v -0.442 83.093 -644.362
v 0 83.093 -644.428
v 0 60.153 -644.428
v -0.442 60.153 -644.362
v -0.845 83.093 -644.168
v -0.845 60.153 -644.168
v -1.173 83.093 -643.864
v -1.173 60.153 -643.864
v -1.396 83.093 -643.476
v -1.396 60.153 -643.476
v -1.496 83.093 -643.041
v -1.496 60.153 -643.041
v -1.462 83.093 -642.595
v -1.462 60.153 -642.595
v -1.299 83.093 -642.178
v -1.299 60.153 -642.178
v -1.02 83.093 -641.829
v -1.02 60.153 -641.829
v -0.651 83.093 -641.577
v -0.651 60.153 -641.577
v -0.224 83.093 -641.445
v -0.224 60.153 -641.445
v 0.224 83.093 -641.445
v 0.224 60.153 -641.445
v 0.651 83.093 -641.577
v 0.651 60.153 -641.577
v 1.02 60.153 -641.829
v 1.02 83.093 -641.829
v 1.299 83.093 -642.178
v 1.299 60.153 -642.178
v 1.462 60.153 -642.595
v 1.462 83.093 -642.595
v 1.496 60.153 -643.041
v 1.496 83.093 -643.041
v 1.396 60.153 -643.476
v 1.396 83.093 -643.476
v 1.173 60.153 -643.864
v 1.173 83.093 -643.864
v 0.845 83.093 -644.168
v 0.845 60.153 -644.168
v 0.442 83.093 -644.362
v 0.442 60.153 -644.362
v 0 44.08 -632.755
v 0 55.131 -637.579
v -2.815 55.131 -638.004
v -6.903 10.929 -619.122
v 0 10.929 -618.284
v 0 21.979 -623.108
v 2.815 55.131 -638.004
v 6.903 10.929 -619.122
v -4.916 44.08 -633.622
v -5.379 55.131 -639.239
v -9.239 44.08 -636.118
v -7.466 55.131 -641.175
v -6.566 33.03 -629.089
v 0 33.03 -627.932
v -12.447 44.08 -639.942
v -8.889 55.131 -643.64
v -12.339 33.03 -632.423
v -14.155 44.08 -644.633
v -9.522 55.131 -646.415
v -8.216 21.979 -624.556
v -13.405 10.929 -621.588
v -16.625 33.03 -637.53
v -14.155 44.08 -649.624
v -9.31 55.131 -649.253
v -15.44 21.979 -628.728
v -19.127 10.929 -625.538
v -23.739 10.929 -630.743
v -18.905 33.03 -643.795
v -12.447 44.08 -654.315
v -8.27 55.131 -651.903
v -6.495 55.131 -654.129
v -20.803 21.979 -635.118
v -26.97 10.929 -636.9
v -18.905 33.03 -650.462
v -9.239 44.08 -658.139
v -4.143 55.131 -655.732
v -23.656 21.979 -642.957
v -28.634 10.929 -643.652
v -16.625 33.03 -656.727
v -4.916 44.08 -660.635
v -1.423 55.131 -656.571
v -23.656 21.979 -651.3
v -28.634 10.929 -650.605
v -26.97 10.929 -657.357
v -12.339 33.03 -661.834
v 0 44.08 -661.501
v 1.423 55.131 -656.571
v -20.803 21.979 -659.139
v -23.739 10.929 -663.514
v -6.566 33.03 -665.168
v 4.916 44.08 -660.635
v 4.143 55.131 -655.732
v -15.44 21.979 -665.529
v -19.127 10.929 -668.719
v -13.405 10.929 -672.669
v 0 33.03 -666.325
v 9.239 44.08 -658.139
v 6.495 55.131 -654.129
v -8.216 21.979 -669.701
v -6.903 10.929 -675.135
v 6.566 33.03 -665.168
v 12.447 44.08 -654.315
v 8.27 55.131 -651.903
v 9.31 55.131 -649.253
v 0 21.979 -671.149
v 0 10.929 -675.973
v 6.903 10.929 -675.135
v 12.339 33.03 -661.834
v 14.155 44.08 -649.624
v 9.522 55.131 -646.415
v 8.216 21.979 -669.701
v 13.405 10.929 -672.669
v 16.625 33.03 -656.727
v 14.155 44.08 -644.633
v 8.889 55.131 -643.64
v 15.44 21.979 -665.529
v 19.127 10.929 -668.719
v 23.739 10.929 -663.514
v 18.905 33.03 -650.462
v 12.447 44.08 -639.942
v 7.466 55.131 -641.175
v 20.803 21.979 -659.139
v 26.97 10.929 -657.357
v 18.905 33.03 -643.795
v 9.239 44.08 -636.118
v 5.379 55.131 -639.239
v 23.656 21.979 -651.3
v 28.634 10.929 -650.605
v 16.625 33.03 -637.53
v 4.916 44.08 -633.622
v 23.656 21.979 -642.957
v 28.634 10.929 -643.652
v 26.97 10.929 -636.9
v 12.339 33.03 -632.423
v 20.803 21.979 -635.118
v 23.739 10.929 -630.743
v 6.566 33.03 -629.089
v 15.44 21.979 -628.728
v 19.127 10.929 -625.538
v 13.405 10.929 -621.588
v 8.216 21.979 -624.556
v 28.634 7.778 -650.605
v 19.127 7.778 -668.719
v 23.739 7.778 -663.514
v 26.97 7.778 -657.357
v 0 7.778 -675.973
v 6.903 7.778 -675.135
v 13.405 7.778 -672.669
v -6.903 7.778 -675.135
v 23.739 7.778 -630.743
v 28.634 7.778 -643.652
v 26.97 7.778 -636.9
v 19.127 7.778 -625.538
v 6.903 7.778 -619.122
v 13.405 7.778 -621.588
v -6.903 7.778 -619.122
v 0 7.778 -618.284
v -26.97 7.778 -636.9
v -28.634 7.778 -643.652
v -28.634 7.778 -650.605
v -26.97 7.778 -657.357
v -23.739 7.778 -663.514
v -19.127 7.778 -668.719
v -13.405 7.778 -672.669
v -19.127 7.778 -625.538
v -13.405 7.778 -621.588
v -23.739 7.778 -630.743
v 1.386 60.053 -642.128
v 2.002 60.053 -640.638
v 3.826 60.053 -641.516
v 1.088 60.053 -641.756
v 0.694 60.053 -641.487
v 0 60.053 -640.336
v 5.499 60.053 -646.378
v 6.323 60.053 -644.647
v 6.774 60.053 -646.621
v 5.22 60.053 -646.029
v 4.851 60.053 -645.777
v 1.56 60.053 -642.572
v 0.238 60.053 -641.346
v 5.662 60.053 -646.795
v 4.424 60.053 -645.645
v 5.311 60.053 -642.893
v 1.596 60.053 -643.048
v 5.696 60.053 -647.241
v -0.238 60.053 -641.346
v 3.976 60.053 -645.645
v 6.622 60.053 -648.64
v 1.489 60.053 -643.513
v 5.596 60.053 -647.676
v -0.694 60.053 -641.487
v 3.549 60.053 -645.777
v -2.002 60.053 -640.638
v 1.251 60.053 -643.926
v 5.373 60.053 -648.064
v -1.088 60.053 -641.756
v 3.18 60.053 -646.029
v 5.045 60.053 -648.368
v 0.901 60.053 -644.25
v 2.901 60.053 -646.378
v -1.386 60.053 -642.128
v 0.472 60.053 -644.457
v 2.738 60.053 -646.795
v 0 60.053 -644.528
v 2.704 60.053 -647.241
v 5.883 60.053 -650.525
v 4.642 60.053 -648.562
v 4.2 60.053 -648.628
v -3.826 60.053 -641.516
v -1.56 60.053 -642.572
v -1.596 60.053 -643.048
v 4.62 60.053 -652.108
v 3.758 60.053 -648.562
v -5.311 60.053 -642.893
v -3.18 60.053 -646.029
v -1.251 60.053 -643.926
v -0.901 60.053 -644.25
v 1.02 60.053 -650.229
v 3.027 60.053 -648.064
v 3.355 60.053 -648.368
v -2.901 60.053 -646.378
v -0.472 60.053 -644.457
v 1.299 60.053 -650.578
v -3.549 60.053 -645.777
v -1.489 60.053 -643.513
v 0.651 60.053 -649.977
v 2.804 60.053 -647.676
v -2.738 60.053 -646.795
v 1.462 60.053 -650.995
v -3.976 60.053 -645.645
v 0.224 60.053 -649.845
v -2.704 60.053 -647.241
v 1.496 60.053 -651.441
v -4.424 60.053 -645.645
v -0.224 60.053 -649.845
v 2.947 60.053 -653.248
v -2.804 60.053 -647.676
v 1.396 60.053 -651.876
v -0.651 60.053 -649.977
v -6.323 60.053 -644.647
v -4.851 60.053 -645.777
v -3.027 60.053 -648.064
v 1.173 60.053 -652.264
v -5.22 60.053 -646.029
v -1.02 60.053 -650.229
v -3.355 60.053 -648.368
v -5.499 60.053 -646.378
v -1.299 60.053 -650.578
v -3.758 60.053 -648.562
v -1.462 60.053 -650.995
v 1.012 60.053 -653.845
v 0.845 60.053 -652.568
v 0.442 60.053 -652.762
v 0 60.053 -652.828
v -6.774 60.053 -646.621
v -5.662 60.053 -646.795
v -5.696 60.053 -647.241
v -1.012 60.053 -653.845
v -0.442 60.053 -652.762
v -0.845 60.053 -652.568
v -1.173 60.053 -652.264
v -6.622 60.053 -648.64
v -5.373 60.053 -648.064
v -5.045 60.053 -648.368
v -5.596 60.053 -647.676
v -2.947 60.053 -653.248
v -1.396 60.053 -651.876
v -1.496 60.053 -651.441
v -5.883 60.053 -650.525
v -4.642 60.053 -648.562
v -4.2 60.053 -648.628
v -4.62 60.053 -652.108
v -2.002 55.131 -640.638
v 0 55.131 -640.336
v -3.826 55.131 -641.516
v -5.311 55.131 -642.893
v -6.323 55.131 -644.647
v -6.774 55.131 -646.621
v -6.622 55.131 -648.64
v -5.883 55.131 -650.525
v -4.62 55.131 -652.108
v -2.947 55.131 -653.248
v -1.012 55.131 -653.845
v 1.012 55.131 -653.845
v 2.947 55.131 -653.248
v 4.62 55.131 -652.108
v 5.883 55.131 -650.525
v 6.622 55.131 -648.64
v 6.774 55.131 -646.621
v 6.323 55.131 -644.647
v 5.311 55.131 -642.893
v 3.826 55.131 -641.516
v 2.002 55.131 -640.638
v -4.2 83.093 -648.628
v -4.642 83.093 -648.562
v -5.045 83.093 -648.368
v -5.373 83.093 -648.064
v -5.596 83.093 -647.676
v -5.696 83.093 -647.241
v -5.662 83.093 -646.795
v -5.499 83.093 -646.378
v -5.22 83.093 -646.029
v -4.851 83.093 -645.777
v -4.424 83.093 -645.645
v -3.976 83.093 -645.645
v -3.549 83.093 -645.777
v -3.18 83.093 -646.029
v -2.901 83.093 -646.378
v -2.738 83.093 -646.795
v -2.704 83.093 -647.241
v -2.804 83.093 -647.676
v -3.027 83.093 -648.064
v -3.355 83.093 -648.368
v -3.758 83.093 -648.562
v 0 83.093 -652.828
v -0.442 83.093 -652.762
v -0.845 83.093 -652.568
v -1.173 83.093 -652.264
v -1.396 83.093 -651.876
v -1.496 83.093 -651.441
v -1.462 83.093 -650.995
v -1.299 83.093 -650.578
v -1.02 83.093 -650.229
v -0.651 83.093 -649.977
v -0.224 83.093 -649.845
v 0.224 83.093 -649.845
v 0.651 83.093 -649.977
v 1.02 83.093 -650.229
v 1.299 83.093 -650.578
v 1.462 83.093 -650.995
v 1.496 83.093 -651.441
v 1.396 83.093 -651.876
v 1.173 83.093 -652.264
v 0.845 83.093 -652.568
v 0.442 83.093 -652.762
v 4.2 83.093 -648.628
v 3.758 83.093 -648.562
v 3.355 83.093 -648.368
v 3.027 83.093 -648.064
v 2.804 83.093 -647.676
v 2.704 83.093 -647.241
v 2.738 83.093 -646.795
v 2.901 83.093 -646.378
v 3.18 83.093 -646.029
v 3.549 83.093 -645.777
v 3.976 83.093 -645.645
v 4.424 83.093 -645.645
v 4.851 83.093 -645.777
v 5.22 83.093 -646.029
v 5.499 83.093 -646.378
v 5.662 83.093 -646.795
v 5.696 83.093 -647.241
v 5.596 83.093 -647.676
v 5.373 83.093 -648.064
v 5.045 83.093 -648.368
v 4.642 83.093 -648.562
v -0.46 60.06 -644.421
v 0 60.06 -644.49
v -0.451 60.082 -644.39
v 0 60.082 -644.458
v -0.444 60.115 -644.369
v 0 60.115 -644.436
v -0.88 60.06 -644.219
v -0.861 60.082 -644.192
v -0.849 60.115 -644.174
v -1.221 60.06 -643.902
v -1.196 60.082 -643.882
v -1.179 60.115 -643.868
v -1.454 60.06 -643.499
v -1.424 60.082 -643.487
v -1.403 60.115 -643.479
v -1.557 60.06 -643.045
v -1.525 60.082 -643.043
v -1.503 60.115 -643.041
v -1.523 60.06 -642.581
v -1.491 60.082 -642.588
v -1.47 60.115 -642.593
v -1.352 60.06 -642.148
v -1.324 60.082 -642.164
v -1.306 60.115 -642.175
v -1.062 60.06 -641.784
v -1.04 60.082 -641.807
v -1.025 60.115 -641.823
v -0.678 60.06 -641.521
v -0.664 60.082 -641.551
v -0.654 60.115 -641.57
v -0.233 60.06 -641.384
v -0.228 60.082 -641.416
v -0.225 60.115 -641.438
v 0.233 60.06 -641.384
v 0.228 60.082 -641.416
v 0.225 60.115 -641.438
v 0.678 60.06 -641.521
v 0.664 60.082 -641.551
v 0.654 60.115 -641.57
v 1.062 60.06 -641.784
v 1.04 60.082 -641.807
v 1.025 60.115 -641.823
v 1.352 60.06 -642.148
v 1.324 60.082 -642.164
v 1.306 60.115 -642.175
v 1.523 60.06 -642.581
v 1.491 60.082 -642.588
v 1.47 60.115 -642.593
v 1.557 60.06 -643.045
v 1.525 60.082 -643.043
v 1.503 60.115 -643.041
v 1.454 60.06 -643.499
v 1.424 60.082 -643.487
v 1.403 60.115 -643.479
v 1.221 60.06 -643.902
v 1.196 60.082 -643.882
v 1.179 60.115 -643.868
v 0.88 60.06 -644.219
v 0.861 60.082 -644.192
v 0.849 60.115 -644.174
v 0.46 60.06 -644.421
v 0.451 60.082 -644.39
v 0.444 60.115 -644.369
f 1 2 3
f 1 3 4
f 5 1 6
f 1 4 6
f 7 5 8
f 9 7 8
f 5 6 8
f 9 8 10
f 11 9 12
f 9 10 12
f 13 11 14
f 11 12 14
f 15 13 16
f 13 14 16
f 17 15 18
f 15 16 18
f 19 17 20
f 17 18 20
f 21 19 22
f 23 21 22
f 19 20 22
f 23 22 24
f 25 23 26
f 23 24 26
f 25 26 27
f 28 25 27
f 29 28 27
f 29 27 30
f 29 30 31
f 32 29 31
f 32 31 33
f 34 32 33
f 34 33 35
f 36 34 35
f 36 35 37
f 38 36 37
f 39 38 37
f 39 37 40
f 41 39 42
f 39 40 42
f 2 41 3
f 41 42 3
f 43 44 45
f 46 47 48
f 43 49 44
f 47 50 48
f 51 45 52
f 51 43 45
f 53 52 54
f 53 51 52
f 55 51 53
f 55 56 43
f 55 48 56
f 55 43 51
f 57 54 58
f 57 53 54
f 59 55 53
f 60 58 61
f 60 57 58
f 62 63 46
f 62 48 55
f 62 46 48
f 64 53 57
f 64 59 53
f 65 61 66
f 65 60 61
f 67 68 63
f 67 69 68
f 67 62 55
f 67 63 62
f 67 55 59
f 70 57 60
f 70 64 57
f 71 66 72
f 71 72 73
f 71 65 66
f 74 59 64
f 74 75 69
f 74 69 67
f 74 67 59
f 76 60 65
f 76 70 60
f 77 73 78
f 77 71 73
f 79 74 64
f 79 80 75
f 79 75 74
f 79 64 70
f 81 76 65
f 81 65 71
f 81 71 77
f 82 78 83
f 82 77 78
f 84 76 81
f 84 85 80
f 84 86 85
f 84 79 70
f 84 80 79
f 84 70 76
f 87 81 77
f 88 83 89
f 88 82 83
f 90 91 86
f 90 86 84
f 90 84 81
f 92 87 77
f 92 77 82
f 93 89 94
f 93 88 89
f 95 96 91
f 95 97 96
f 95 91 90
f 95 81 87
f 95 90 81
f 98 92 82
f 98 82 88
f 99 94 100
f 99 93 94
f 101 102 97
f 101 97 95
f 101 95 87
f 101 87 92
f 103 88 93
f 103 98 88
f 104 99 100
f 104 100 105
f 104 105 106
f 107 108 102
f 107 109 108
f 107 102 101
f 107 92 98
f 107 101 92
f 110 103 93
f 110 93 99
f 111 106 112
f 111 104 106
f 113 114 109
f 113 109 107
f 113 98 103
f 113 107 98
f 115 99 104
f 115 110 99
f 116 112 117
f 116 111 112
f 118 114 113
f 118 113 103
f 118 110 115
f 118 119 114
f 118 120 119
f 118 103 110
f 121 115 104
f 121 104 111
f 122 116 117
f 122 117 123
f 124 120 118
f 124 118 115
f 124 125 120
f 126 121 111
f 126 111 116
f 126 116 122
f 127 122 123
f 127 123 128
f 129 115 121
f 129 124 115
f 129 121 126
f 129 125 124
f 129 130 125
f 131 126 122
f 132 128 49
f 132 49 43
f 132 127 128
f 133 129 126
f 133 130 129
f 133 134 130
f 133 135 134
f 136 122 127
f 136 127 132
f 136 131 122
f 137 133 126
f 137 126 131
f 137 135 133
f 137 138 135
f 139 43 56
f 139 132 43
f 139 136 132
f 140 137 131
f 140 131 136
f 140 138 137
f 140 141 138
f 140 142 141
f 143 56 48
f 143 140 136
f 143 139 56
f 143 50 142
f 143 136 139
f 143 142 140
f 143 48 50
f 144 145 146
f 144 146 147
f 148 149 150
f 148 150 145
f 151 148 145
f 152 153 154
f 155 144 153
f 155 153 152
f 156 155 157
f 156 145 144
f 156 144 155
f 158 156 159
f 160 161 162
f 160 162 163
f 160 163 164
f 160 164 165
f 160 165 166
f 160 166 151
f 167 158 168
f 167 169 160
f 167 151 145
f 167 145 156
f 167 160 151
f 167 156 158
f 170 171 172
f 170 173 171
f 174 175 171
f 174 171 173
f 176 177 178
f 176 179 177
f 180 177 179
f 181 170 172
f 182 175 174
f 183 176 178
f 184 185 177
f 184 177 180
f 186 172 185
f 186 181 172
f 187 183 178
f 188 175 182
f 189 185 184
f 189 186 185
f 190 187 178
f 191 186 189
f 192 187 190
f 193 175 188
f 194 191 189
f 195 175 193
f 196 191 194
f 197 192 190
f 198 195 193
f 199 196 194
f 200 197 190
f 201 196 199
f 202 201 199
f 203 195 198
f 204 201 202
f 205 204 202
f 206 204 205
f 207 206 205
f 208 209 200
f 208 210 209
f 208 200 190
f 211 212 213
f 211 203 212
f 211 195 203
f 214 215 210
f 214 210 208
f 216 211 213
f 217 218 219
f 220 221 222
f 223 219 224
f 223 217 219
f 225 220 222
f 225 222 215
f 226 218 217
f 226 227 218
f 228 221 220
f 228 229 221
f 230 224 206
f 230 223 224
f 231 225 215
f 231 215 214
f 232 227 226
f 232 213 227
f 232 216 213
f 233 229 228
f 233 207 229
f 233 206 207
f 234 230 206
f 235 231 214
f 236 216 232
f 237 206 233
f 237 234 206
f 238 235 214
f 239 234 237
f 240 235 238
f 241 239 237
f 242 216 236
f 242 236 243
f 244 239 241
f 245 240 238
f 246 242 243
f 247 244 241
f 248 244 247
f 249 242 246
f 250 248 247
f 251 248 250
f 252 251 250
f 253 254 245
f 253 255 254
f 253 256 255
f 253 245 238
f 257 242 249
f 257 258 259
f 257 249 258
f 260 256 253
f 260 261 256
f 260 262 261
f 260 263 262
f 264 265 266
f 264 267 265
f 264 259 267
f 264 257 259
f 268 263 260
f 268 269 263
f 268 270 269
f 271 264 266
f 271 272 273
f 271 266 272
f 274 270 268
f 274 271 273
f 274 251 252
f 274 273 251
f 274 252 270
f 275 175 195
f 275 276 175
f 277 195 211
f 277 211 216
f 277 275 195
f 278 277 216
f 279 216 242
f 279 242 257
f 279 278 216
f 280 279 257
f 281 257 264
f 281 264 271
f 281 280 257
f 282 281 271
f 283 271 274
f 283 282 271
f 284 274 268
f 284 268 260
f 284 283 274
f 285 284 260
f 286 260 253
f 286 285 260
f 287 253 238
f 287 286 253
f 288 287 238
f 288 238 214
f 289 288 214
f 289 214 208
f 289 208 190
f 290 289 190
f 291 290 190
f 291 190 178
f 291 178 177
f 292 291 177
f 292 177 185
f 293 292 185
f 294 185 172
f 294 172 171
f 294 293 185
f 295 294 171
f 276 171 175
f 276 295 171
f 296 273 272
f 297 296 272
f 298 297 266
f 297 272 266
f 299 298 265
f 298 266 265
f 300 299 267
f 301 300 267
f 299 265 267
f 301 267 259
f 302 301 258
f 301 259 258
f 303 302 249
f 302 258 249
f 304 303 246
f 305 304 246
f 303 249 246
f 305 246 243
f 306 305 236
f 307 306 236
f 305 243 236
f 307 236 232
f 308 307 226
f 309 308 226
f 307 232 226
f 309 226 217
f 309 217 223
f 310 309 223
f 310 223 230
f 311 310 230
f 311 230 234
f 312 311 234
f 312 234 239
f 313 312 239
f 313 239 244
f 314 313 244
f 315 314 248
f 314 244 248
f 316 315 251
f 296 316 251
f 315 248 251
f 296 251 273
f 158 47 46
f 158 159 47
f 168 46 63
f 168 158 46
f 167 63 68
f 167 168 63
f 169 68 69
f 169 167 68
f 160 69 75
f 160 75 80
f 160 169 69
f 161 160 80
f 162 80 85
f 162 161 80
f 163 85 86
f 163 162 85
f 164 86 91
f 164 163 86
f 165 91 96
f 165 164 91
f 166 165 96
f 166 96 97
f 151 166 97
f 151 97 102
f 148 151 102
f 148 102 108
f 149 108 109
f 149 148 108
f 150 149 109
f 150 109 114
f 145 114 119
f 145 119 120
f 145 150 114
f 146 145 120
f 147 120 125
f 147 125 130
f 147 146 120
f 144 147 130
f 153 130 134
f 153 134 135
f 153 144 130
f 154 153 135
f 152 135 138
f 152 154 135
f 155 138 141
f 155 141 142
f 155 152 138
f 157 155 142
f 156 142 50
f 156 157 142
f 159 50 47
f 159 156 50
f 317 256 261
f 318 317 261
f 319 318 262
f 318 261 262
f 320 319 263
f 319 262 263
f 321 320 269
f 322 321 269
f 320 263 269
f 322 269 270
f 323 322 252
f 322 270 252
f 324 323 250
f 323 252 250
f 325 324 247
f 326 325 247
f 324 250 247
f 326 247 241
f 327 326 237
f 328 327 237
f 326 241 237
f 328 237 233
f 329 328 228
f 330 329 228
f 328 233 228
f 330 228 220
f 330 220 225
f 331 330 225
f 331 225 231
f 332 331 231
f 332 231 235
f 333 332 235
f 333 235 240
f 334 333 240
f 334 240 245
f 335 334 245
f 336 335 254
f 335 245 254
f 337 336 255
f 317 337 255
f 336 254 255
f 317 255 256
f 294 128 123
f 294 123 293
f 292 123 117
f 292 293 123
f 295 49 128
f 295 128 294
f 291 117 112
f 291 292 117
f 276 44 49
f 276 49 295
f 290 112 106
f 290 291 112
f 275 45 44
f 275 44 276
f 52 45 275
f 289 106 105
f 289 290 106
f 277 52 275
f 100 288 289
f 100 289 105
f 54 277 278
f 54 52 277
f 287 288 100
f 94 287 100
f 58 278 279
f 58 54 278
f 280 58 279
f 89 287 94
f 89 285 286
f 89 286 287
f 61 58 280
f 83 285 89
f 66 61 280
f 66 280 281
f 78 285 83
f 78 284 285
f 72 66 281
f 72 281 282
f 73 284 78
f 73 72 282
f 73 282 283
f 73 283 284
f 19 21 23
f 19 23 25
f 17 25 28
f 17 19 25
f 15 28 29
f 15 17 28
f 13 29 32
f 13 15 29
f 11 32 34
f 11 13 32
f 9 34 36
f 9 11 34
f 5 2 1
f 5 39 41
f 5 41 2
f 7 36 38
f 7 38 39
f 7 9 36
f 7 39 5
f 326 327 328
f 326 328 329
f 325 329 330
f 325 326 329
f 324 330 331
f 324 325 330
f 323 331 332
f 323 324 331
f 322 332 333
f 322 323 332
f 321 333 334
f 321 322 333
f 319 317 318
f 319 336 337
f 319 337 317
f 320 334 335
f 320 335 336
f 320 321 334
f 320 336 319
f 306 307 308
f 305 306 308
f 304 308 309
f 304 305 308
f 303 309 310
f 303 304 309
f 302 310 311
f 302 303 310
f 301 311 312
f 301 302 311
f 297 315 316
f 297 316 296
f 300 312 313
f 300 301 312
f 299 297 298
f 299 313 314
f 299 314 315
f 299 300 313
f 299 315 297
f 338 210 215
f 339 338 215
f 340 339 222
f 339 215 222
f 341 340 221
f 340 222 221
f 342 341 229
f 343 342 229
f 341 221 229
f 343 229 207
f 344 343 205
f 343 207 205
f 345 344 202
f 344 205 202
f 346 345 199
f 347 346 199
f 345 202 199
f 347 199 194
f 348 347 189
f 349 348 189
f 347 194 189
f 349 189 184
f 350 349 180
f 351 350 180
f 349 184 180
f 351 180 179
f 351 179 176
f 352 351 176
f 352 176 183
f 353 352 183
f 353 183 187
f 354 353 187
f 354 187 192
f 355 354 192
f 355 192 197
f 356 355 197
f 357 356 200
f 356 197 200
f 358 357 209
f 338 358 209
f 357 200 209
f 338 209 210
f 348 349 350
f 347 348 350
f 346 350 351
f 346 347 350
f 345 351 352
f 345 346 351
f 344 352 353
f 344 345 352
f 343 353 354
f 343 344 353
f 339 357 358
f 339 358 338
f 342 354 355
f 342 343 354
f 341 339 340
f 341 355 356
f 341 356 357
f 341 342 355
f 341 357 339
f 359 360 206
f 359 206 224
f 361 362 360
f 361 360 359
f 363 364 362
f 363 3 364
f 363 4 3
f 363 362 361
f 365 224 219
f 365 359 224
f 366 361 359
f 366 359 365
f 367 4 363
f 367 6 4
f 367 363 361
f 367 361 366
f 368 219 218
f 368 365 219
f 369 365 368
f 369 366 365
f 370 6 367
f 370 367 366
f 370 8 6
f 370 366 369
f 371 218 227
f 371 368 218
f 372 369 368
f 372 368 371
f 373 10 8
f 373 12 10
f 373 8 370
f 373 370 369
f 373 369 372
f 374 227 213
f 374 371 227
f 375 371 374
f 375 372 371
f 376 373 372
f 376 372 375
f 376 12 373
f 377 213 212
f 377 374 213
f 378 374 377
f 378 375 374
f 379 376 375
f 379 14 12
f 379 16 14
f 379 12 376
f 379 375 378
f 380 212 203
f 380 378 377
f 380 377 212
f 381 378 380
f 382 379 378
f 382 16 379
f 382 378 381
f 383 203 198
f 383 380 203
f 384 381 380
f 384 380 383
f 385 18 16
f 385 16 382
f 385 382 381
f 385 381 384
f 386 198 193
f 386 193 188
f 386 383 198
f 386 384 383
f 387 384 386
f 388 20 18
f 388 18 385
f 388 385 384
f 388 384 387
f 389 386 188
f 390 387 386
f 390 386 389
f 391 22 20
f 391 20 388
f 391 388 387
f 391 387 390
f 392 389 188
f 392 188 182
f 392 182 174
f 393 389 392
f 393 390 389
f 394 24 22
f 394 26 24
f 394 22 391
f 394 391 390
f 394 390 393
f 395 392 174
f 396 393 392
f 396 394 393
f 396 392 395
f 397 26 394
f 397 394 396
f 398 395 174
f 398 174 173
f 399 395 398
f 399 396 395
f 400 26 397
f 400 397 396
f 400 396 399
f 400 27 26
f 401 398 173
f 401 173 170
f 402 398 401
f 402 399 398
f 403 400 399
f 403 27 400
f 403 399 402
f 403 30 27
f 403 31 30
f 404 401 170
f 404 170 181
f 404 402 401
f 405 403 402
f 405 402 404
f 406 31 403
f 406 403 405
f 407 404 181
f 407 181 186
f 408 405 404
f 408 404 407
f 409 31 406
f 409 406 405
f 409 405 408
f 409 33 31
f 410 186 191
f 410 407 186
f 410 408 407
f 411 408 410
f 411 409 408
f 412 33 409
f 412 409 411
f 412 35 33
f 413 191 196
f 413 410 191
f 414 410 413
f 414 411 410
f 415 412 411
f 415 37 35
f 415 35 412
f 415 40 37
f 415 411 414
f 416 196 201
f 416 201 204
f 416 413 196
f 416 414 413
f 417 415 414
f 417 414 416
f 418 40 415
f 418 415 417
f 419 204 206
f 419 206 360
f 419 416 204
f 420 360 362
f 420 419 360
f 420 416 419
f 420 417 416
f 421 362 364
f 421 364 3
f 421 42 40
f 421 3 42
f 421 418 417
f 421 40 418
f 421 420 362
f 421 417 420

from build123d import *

# Parameters (mm, degrees)
SKETCH2_R           = 1.5
BOSS_EXTRUDE1_DEPTH = 23.04
FILLET1_R           = 0.1


with BuildPart() as part:
    # Sketch1 → Revolve1 (revolve)
    with BuildSketch(Plane(origin=(0, 0, 0), x_dir=(0, 0, -1), z_dir=(1, 0, 0))):
        Polygon((618.283966683, 10.92855784), (618.283966683, 7.778306403), (647.128456403, 7.778306403), (647.128456403, 60.052791184), (640.335726742, 60.052791184), (640.335726742, 55.130523314), (637.579256734, 55.130523314), align=None)
    revolve(axis=Axis((0, 60.052791184, -647.128456403), (0, -1, 0)))

    # Sketch2 → Boss-Extrude1 (add)
    with BuildSketch(Plane(origin=(0, 60.052791184, 0), x_dir=(1, 0, 0), z_dir=(0, 1, 0))):
        with Locations(Location((0, 651.328456403, 0), (0, 0, 90))):
            Circle(SKETCH2_R)
        with Locations(Location((-4.2, 647.128456403, 0), (0, 0, 90))):
            Circle(SKETCH2_R)
        with Locations(Location((0, 642.928456403, 0), (0, 0, 90))):
            Circle(SKETCH2_R)
        with Locations(Location((4.2, 647.128456403, 0), (0, 0, 90))):
            Circle(SKETCH2_R)
    extrude(amount=BOSS_EXTRUDE1_DEPTH)

    # Fillet1
    fillet1_edges = [part.edges().sort_by_distance(p)[0] for p in [
        (0, 60.052791184, -641.428456403),
    ]]
    fillet(fillet1_edges, radius=FILLET1_R)


solid = part.part
